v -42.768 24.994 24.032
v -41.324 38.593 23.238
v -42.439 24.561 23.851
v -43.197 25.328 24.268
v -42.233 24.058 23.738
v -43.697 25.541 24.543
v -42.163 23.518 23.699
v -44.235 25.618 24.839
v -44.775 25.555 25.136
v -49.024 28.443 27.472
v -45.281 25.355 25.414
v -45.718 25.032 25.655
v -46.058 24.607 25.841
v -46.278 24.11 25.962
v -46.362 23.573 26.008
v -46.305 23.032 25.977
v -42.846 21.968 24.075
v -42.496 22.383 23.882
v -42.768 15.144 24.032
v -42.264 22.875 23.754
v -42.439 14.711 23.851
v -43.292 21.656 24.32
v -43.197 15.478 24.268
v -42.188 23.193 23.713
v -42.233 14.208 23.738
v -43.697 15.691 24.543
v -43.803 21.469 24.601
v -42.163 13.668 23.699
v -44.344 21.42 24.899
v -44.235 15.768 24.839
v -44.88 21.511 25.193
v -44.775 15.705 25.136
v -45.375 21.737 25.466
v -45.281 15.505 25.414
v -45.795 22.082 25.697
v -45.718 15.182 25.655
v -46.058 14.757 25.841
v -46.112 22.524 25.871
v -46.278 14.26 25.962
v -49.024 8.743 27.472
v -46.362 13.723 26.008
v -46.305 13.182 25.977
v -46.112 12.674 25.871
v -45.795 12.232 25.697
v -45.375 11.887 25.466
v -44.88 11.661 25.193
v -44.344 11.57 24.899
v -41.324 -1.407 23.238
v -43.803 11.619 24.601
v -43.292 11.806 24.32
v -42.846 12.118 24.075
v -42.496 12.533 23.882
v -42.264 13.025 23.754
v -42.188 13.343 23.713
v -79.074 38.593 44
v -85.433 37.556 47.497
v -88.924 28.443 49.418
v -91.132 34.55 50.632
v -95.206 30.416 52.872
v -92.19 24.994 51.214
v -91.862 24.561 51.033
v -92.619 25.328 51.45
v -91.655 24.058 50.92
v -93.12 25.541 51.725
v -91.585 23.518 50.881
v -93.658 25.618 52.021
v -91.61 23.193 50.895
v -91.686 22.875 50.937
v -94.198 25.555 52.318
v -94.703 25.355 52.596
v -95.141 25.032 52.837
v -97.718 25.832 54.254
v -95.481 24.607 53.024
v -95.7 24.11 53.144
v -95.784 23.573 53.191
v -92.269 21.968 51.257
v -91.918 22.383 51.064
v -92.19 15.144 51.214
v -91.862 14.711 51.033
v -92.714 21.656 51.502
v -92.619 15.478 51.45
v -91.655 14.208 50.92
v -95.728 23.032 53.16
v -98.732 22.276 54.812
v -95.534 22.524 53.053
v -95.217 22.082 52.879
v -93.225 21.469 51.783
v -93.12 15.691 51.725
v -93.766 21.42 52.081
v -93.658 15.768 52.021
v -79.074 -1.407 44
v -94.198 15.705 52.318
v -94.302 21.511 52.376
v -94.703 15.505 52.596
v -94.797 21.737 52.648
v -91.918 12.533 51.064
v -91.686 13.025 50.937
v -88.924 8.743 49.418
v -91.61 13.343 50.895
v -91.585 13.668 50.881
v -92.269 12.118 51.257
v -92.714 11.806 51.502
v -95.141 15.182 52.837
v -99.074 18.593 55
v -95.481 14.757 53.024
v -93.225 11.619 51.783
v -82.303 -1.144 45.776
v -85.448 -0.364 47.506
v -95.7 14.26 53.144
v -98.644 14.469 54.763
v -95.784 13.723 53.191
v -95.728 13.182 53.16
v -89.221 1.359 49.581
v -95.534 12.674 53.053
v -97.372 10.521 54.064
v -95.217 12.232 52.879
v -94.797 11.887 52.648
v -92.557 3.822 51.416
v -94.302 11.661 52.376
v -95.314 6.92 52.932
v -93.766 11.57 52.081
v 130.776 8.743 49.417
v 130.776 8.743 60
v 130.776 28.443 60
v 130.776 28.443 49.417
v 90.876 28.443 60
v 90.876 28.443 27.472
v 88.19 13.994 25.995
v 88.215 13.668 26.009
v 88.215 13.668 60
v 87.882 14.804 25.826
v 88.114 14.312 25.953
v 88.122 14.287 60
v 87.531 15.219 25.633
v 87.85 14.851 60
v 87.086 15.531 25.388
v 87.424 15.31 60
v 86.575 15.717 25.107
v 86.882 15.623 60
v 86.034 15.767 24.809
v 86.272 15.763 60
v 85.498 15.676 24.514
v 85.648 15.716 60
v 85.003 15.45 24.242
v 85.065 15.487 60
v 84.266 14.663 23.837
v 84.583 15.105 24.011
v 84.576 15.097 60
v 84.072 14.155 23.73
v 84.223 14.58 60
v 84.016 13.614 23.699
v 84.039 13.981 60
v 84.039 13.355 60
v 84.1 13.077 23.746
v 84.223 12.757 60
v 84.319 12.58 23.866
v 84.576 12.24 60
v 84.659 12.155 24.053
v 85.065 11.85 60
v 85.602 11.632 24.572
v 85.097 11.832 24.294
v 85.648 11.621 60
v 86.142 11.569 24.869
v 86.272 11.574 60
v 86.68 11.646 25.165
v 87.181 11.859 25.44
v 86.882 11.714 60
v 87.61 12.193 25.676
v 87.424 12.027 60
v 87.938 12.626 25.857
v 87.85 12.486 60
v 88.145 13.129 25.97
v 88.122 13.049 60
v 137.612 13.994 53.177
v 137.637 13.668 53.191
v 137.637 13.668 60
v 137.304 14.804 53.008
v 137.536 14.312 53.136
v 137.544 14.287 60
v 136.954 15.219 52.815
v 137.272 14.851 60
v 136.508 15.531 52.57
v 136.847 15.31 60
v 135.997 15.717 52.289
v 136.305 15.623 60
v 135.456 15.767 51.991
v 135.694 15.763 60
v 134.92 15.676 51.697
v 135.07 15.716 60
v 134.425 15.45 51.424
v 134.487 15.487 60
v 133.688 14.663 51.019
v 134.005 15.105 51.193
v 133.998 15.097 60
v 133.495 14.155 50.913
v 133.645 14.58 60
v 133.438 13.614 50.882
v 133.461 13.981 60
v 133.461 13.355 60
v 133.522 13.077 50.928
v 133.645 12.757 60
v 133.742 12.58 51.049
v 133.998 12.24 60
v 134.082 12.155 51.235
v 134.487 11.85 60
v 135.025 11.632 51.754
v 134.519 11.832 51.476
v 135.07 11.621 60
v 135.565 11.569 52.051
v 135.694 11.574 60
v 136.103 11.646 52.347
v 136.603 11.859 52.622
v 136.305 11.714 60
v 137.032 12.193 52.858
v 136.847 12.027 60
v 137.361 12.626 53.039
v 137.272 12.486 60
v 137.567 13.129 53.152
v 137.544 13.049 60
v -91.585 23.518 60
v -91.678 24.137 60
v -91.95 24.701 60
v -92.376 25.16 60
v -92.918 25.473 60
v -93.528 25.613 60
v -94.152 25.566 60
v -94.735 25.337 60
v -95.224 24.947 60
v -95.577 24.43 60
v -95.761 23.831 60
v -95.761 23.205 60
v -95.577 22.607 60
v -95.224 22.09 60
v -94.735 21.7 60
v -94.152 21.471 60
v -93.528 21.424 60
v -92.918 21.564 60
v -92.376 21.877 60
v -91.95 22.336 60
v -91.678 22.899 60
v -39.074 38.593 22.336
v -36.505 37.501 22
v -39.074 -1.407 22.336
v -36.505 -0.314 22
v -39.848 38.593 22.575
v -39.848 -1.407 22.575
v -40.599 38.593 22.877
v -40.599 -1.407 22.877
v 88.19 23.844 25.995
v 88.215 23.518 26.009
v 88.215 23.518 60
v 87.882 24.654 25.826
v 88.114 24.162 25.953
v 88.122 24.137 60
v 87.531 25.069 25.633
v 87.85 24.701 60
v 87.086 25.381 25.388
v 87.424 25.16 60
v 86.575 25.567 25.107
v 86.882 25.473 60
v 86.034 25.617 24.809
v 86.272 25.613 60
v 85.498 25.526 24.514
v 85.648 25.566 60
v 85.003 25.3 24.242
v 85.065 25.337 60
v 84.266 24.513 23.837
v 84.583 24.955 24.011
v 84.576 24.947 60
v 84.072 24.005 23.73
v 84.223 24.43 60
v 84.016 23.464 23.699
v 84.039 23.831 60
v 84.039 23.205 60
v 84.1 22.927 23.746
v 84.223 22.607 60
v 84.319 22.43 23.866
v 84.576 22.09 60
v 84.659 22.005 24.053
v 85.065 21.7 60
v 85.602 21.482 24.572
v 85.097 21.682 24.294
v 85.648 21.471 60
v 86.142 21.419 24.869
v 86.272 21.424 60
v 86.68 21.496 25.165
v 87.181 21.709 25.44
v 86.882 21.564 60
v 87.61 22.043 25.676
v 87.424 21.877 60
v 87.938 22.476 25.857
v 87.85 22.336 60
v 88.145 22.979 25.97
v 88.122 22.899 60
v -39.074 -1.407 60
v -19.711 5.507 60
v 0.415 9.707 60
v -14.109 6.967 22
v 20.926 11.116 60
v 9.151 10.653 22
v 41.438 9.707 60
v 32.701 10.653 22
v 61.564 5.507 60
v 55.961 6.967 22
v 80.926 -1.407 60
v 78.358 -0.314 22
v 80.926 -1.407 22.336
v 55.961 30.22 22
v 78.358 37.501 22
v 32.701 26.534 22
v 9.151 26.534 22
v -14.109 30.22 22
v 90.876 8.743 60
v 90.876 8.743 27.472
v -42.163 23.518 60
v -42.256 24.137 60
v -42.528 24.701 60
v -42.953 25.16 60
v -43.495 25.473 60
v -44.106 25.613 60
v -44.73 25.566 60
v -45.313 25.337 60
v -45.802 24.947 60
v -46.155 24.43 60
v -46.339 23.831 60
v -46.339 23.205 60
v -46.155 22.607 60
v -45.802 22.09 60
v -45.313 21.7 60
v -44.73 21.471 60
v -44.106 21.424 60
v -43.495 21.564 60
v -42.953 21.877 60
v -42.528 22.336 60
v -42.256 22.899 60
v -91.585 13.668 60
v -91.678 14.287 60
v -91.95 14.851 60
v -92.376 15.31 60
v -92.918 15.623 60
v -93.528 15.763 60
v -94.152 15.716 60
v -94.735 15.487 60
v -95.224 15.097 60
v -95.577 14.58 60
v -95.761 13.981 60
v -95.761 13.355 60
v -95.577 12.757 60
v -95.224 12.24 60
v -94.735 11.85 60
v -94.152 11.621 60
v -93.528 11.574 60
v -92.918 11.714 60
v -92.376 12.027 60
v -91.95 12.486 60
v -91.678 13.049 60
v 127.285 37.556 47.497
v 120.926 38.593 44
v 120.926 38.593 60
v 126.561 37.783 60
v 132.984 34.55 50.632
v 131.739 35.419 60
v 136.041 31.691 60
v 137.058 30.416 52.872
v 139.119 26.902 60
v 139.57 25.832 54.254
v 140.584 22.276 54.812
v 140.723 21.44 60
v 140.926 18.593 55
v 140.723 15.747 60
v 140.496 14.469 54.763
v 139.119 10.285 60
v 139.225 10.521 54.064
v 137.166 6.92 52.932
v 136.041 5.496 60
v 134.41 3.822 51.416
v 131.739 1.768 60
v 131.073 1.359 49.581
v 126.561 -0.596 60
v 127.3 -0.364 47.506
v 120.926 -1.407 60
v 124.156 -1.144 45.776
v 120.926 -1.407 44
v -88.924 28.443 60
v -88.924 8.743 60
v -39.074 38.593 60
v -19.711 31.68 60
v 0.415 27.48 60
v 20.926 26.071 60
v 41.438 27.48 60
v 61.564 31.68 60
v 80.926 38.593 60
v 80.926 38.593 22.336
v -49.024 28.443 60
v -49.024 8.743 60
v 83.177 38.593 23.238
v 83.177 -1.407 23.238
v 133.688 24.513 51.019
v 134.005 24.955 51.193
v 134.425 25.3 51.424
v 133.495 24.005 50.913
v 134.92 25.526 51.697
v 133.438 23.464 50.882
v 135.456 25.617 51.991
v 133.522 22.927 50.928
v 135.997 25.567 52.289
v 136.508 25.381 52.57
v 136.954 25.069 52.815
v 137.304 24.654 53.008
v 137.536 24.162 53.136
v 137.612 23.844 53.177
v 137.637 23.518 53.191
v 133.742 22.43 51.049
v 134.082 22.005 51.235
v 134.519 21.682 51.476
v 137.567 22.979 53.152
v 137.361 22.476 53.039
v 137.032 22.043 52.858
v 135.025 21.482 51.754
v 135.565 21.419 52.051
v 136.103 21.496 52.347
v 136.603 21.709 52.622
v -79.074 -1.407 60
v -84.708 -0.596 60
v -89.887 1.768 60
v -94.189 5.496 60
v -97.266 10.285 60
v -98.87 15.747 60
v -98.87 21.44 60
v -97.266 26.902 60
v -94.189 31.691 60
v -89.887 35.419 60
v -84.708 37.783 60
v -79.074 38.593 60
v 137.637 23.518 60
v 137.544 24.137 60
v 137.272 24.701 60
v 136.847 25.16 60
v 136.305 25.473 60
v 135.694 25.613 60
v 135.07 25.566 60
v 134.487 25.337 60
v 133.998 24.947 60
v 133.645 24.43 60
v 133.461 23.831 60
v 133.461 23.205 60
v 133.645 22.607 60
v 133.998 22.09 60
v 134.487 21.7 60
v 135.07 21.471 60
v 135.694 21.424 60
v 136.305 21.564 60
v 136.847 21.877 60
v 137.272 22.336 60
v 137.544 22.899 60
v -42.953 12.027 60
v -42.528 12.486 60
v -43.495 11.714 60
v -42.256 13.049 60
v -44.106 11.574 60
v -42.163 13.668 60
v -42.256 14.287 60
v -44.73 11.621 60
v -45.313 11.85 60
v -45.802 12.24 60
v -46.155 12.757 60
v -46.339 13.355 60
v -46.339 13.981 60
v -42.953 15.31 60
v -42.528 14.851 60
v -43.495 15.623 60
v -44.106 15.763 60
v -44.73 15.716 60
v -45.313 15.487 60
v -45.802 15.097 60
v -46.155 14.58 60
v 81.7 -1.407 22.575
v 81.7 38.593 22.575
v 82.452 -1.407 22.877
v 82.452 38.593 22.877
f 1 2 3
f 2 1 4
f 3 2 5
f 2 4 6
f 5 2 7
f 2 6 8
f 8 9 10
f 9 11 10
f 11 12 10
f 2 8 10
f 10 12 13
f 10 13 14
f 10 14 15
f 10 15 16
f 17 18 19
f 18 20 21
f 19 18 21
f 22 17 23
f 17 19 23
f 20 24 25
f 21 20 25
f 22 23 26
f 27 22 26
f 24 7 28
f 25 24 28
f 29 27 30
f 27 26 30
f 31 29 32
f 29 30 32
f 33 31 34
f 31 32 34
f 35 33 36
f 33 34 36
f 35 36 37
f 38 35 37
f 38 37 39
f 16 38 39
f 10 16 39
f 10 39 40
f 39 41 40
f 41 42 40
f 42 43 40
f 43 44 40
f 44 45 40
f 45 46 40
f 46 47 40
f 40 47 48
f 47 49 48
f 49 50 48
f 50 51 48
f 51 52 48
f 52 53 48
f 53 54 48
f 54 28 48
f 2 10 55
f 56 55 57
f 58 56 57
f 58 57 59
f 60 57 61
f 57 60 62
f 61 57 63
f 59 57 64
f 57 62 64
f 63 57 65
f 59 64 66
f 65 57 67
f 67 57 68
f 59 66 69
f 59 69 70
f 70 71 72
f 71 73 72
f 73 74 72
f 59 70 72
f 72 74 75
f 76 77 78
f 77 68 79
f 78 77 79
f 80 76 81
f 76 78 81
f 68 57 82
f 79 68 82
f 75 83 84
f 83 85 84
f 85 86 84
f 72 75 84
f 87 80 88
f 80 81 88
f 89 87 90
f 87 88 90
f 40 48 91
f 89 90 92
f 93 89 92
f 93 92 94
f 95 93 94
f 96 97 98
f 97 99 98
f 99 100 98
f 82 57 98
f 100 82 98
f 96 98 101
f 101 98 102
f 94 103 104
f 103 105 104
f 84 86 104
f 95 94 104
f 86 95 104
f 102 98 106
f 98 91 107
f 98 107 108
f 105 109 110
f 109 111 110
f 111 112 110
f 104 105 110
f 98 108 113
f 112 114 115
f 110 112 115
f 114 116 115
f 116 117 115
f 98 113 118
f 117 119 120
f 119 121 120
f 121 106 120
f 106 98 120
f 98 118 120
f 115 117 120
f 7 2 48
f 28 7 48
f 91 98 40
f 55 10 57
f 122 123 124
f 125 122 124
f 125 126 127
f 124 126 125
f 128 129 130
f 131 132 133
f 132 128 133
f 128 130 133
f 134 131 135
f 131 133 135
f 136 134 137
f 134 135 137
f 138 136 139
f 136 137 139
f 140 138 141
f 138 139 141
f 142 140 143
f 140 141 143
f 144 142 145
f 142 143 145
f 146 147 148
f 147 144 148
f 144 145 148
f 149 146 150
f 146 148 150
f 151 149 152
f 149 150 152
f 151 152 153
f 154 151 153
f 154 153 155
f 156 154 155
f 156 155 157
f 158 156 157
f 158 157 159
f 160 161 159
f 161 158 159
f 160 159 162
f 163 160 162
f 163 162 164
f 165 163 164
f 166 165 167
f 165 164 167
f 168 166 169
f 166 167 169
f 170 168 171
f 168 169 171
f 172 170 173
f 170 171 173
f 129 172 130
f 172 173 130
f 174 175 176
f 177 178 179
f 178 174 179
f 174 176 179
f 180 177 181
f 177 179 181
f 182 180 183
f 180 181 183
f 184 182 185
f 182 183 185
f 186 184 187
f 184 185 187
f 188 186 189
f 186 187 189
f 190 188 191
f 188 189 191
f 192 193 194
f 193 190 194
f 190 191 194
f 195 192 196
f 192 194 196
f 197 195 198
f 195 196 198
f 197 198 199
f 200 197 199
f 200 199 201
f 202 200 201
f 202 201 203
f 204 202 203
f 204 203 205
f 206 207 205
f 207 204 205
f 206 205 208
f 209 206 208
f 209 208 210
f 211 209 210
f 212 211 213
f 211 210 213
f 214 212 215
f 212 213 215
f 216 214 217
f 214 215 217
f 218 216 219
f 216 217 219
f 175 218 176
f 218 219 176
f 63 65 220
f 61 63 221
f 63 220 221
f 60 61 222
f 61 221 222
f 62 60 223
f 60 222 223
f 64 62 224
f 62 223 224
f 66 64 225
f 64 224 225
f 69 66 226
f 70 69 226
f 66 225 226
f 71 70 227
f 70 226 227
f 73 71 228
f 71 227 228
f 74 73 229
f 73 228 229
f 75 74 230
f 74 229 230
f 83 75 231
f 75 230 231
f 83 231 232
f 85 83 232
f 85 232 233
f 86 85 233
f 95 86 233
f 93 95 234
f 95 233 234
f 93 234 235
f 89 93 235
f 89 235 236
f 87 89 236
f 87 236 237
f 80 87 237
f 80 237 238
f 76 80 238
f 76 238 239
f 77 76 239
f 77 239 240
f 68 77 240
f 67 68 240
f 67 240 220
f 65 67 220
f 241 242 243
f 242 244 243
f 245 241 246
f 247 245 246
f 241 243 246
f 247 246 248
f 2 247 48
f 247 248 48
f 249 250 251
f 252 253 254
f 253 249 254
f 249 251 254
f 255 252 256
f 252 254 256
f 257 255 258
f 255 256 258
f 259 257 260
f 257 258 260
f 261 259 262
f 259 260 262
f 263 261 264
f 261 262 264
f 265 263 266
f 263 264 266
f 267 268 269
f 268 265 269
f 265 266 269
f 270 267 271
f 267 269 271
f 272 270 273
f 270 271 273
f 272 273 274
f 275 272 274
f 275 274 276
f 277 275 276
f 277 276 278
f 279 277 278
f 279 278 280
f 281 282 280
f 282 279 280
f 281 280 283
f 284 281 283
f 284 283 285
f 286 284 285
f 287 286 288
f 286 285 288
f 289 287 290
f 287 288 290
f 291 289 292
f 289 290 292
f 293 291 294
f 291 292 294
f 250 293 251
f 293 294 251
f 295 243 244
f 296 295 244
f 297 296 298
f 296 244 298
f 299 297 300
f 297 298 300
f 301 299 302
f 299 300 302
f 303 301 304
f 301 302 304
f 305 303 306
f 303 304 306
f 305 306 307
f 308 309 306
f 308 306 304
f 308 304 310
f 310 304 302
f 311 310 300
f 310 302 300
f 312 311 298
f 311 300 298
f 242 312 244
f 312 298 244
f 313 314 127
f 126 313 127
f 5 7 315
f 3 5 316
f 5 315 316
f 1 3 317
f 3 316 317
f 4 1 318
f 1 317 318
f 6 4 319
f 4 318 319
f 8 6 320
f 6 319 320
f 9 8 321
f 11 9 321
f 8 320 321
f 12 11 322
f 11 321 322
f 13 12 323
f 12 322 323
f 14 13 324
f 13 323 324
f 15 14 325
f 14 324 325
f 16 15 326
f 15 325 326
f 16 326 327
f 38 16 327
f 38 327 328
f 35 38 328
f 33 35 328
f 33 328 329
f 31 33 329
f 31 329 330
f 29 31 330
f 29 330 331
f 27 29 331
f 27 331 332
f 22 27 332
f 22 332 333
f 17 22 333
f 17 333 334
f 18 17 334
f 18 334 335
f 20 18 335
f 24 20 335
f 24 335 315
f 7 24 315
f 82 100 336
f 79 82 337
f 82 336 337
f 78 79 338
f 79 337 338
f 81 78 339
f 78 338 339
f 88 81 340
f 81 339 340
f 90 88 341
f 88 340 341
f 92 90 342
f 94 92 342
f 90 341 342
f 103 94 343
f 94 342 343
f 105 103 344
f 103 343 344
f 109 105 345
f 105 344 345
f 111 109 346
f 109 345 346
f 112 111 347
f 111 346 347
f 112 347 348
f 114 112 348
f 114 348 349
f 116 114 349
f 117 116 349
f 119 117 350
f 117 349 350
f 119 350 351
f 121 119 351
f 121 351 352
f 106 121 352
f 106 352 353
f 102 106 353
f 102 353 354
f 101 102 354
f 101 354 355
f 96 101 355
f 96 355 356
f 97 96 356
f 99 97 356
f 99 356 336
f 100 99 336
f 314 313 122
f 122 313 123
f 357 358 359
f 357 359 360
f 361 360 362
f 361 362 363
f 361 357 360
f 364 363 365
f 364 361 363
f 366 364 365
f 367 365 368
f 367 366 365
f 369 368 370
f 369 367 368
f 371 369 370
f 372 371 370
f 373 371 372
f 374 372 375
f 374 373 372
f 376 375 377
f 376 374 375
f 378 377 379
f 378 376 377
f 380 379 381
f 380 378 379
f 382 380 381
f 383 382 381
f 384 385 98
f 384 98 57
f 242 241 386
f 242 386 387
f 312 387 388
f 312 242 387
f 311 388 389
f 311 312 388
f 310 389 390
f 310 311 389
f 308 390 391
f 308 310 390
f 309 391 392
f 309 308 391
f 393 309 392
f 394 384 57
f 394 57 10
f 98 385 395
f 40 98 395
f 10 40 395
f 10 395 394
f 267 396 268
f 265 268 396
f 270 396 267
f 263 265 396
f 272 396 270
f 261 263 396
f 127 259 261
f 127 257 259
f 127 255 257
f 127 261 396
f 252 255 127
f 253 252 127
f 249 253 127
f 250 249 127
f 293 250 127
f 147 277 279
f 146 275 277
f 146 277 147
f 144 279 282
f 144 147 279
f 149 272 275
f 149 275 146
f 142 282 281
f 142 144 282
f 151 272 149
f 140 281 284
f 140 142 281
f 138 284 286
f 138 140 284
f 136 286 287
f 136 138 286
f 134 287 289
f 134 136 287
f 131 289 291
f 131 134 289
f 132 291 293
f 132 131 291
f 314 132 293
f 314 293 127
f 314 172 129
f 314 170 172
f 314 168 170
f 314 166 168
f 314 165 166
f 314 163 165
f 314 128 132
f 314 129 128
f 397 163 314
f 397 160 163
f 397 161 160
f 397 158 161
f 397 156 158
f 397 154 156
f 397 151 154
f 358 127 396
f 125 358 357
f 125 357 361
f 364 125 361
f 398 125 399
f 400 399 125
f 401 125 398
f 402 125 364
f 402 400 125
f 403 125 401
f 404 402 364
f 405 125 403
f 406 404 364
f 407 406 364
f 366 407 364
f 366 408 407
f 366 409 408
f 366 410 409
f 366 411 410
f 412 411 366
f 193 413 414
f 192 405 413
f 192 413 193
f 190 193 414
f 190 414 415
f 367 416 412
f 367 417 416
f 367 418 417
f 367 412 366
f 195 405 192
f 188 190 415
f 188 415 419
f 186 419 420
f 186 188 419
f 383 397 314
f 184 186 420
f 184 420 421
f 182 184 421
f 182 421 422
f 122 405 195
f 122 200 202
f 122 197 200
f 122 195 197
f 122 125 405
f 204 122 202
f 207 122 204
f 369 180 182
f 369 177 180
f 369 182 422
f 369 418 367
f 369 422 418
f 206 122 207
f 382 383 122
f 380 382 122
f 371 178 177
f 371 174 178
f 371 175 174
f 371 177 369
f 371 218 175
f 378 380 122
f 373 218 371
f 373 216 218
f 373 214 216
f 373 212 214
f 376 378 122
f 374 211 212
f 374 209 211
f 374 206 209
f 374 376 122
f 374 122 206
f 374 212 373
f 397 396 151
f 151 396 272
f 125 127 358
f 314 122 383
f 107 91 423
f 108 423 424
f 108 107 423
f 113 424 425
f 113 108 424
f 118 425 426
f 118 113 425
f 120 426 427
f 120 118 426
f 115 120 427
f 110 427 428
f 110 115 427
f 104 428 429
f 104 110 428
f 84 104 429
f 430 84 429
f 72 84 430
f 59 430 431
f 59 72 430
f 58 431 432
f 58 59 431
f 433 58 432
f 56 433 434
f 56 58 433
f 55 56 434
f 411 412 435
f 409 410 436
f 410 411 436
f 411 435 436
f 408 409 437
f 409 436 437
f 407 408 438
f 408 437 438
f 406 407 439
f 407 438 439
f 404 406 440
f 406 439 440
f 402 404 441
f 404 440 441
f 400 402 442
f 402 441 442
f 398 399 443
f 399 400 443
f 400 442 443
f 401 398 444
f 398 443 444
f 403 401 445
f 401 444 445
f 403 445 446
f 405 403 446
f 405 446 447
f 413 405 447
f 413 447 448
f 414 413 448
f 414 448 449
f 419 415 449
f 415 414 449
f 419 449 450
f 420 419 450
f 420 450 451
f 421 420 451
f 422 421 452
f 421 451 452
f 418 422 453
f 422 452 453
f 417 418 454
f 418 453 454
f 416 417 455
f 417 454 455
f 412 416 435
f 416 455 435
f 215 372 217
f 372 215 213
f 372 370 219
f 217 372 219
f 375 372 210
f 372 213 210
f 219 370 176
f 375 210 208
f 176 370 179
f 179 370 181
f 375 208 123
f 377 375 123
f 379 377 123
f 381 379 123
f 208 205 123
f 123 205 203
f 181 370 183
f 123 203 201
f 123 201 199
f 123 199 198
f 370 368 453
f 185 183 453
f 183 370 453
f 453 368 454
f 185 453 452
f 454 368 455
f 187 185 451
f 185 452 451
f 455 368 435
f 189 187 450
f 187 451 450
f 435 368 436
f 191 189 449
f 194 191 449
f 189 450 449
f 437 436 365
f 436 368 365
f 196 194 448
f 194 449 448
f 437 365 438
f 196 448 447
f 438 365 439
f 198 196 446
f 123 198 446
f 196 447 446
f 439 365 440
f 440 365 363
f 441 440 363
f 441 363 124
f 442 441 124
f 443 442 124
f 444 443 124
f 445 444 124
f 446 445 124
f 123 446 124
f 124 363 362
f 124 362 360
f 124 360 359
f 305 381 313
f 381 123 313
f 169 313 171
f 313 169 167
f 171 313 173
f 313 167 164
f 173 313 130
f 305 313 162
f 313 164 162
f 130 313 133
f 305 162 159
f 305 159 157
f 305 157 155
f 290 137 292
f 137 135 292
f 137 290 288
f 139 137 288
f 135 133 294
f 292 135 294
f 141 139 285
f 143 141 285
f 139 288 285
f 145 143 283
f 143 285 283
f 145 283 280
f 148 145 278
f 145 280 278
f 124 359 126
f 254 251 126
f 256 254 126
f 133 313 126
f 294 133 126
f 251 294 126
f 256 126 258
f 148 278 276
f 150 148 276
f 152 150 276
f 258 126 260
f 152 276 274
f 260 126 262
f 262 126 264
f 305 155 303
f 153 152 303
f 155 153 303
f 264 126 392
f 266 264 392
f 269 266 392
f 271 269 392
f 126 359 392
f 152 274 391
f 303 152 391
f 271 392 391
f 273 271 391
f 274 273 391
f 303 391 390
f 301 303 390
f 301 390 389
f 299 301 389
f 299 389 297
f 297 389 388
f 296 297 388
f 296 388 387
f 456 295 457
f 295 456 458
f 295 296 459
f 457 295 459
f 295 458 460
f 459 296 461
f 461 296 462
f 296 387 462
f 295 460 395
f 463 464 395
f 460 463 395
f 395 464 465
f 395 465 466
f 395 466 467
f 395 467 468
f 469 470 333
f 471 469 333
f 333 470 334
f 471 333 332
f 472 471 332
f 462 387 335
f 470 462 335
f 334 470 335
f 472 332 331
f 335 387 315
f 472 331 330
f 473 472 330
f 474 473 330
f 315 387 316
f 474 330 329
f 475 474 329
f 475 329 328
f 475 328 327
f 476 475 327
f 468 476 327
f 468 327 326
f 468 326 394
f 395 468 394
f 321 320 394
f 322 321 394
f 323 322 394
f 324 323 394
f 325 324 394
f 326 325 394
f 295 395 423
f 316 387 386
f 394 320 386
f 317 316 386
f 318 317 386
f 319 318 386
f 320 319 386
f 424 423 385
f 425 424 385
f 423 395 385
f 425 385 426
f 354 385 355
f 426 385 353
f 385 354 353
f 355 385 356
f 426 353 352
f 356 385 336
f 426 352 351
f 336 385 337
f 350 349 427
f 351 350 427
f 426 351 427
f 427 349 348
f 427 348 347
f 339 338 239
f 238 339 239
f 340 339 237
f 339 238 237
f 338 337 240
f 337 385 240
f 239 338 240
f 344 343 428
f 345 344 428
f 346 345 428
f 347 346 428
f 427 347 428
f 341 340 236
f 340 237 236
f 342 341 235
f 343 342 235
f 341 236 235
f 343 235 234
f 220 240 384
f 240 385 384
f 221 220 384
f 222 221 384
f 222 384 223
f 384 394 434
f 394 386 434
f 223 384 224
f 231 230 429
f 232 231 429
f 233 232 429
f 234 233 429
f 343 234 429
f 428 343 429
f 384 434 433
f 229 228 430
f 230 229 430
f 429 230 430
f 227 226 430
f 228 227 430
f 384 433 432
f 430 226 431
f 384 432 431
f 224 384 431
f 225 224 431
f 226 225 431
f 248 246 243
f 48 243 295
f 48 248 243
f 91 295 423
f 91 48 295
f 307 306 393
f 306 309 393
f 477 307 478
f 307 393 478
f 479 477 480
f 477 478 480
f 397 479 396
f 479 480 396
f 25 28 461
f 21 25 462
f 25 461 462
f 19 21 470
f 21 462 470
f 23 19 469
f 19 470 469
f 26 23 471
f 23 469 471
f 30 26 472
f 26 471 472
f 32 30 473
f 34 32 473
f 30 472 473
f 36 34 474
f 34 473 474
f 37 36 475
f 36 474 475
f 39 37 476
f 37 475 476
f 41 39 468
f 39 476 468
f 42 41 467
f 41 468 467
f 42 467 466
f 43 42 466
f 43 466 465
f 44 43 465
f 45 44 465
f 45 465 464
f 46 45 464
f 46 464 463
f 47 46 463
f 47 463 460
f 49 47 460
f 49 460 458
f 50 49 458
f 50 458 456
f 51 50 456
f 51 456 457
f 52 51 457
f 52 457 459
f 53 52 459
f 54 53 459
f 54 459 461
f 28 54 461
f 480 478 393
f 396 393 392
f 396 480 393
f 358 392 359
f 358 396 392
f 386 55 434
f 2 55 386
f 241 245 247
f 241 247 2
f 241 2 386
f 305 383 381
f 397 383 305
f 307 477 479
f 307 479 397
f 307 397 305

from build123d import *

# Parameters (mm, degrees)
SKETCH1_R           = 2.73935274
BOSS_EXTRUDE1_DEPTH = 60
SKETCH17_R          = 2.1
SKETCH17_W          = 39.9
SKETCH17_H          = 19.7
CUT_EXTRUDE10_DEPTH = 158.954623162
CUT_EXTRUDE11_DEPTH = 159.304157008
SKETCH19_W          = 123.088854382
SKETCH19_H          = 22
CUT_EXTRUDE12_DEPTH = 159.304157008
CUT_EXTRUDE14_DEPTH = 151.975703271
FILLET3_R           = 10
FILLET4_R           = 10
SKETCH16_R          = 2.1
SKETCH16_W          = 39.9
SKETCH16_H          = 19.7
CUT_EXTRUDE15_DEPTH = 40


with BuildPart() as part:
    # Sketch1 → Boss-Extrude1 (new body)
    with BuildSketch(Plane.XY):
        with BuildLine():
            Line((-79.073756432, 38.59348199), (120.926243568, 38.59348199))
            ThreePointArc((120.926243568, 38.59348199), (140.926243568, 18.59348199), (120.926243568, -1.40651801))
            Line((120.926243568, -1.40651801), (-79.073756432, -1.40651801))
            ThreePointArc((-79.073756432, -1.40651801), (-99.073756432, 18.59348199), (-79.073756432, 38.59348199))
        make_face()
        with Locations((-79.073756432, 18.59348199)):
            Circle(SKETCH1_R, mode=Mode.SUBTRACT)
        with Locations((120.926243568, 18.59348199)):
            Circle(SKETCH1_R, mode=Mode.SUBTRACT)
    extrude(amount=BOSS_EXTRUDE1_DEPTH)

    # Sketch17 → Cut-Extrude10 (cut, through all)
    with BuildSketch(Plane.XY.offset(60)):
        with Locations((86.11509795, 23.51848199)):
            Circle(SKETCH17_R)
        with Locations((86.11509795, 13.66848199)):
            Circle(SKETCH17_R)
        with Locations((135.537389186, 23.51848199)):
            Circle(SKETCH17_R)
        with Locations((135.537389186, 13.66848199)):
            Circle(SKETCH17_R)
        with Locations((110.826243568, 18.59348199)):
            Rectangle(SKETCH17_W, SKETCH17_H)
    extrude(amount=-CUT_EXTRUDE10_DEPTH, mode=Mode.SUBTRACT)

    # Sketch18 → Cut-Extrude11 (cut, through all)
    with BuildSketch(Plane(origin=(0, -1.40651801, 0), x_dir=(-1, 0, 0), z_dir=(0, -1, 0))):
        Polygon((-140.926243568, -55), (-140.926243568, 0), (-40.926243568, 0), align=None)
        Polygon((99.073756432, -55), (99.073756432, 0), (-0.926243568, 0), align=None)
    extrude(amount=-CUT_EXTRUDE11_DEPTH, mode=Mode.SUBTRACT)

    # Sketch19 → Cut-Extrude12 (cut, through all)
    with BuildSketch(Plane(origin=(0, -1.40651801, 0), x_dir=(-1, 0, 0), z_dir=(0, -1, 0))):
        with Locations((-19.381816377, -11)):
            Rectangle(SKETCH19_W, SKETCH19_H)
    extrude(amount=-CUT_EXTRUDE12_DEPTH, mode=Mode.SUBTRACT)

    # Sketch22 → Cut-Extrude14 (cut, through all)
    with BuildSketch(Plane(origin=(0, 0, 22), x_dir=(-1, 0, 0), z_dir=(0, 0, -1))):
        with BuildLine():
            Line((-80.926243568, 38.59348199), (39.073756432, 38.59348199))
            ThreePointArc((39.073756432, 38.59348199), (-20.926243568, 26.070752838), (-80.926243568, 38.59348199))
        make_face()
        with BuildLine():
            Line((-80.926243568, -1.40651801), (39.073756432, -1.40651801))
            ThreePointArc((39.073756432, -1.40651801), (-20.926243568, 11.116211141), (-80.926243568, -1.40651801))
        make_face()
    extrude(amount=-CUT_EXTRUDE14_DEPTH, mode=Mode.SUBTRACT)

    # Fillet3
    fillet3_edges = [part.edges().sort_by_distance(p)[0] for p in [
        (80.926243568, 18.59348199, 22),
    ]]
    fillet(fillet3_edges, radius=FILLET3_R)

    # Fillet4
    fillet4_edges = [part.edges().sort_by_distance(p)[0] for p in [
        (-39.073756432, 18.59348199, 22),
    ]]
    fillet(fillet4_edges, radius=FILLET4_R)

    # Sketch16 → Cut-Extrude15 (cut)
    with BuildSketch(Plane.XY.offset(60)):
        with Locations((-93.68490205, 23.51848199)):
            Circle(SKETCH16_R)
        with Locations((-93.68490205, 13.66848199)):
            Circle(SKETCH16_R)
        with Locations((-44.262610814, 23.51848199)):
            Circle(SKETCH16_R)
        with Locations((-44.262610814, 13.66848199)):
            Circle(SKETCH16_R)
        with Locations((-68.973756432, 18.59348199)):
            Rectangle(SKETCH16_W, SKETCH16_H)
    extrude(amount=-CUT_EXTRUDE15_DEPTH, mode=Mode.SUBTRACT)


solid = part.part
